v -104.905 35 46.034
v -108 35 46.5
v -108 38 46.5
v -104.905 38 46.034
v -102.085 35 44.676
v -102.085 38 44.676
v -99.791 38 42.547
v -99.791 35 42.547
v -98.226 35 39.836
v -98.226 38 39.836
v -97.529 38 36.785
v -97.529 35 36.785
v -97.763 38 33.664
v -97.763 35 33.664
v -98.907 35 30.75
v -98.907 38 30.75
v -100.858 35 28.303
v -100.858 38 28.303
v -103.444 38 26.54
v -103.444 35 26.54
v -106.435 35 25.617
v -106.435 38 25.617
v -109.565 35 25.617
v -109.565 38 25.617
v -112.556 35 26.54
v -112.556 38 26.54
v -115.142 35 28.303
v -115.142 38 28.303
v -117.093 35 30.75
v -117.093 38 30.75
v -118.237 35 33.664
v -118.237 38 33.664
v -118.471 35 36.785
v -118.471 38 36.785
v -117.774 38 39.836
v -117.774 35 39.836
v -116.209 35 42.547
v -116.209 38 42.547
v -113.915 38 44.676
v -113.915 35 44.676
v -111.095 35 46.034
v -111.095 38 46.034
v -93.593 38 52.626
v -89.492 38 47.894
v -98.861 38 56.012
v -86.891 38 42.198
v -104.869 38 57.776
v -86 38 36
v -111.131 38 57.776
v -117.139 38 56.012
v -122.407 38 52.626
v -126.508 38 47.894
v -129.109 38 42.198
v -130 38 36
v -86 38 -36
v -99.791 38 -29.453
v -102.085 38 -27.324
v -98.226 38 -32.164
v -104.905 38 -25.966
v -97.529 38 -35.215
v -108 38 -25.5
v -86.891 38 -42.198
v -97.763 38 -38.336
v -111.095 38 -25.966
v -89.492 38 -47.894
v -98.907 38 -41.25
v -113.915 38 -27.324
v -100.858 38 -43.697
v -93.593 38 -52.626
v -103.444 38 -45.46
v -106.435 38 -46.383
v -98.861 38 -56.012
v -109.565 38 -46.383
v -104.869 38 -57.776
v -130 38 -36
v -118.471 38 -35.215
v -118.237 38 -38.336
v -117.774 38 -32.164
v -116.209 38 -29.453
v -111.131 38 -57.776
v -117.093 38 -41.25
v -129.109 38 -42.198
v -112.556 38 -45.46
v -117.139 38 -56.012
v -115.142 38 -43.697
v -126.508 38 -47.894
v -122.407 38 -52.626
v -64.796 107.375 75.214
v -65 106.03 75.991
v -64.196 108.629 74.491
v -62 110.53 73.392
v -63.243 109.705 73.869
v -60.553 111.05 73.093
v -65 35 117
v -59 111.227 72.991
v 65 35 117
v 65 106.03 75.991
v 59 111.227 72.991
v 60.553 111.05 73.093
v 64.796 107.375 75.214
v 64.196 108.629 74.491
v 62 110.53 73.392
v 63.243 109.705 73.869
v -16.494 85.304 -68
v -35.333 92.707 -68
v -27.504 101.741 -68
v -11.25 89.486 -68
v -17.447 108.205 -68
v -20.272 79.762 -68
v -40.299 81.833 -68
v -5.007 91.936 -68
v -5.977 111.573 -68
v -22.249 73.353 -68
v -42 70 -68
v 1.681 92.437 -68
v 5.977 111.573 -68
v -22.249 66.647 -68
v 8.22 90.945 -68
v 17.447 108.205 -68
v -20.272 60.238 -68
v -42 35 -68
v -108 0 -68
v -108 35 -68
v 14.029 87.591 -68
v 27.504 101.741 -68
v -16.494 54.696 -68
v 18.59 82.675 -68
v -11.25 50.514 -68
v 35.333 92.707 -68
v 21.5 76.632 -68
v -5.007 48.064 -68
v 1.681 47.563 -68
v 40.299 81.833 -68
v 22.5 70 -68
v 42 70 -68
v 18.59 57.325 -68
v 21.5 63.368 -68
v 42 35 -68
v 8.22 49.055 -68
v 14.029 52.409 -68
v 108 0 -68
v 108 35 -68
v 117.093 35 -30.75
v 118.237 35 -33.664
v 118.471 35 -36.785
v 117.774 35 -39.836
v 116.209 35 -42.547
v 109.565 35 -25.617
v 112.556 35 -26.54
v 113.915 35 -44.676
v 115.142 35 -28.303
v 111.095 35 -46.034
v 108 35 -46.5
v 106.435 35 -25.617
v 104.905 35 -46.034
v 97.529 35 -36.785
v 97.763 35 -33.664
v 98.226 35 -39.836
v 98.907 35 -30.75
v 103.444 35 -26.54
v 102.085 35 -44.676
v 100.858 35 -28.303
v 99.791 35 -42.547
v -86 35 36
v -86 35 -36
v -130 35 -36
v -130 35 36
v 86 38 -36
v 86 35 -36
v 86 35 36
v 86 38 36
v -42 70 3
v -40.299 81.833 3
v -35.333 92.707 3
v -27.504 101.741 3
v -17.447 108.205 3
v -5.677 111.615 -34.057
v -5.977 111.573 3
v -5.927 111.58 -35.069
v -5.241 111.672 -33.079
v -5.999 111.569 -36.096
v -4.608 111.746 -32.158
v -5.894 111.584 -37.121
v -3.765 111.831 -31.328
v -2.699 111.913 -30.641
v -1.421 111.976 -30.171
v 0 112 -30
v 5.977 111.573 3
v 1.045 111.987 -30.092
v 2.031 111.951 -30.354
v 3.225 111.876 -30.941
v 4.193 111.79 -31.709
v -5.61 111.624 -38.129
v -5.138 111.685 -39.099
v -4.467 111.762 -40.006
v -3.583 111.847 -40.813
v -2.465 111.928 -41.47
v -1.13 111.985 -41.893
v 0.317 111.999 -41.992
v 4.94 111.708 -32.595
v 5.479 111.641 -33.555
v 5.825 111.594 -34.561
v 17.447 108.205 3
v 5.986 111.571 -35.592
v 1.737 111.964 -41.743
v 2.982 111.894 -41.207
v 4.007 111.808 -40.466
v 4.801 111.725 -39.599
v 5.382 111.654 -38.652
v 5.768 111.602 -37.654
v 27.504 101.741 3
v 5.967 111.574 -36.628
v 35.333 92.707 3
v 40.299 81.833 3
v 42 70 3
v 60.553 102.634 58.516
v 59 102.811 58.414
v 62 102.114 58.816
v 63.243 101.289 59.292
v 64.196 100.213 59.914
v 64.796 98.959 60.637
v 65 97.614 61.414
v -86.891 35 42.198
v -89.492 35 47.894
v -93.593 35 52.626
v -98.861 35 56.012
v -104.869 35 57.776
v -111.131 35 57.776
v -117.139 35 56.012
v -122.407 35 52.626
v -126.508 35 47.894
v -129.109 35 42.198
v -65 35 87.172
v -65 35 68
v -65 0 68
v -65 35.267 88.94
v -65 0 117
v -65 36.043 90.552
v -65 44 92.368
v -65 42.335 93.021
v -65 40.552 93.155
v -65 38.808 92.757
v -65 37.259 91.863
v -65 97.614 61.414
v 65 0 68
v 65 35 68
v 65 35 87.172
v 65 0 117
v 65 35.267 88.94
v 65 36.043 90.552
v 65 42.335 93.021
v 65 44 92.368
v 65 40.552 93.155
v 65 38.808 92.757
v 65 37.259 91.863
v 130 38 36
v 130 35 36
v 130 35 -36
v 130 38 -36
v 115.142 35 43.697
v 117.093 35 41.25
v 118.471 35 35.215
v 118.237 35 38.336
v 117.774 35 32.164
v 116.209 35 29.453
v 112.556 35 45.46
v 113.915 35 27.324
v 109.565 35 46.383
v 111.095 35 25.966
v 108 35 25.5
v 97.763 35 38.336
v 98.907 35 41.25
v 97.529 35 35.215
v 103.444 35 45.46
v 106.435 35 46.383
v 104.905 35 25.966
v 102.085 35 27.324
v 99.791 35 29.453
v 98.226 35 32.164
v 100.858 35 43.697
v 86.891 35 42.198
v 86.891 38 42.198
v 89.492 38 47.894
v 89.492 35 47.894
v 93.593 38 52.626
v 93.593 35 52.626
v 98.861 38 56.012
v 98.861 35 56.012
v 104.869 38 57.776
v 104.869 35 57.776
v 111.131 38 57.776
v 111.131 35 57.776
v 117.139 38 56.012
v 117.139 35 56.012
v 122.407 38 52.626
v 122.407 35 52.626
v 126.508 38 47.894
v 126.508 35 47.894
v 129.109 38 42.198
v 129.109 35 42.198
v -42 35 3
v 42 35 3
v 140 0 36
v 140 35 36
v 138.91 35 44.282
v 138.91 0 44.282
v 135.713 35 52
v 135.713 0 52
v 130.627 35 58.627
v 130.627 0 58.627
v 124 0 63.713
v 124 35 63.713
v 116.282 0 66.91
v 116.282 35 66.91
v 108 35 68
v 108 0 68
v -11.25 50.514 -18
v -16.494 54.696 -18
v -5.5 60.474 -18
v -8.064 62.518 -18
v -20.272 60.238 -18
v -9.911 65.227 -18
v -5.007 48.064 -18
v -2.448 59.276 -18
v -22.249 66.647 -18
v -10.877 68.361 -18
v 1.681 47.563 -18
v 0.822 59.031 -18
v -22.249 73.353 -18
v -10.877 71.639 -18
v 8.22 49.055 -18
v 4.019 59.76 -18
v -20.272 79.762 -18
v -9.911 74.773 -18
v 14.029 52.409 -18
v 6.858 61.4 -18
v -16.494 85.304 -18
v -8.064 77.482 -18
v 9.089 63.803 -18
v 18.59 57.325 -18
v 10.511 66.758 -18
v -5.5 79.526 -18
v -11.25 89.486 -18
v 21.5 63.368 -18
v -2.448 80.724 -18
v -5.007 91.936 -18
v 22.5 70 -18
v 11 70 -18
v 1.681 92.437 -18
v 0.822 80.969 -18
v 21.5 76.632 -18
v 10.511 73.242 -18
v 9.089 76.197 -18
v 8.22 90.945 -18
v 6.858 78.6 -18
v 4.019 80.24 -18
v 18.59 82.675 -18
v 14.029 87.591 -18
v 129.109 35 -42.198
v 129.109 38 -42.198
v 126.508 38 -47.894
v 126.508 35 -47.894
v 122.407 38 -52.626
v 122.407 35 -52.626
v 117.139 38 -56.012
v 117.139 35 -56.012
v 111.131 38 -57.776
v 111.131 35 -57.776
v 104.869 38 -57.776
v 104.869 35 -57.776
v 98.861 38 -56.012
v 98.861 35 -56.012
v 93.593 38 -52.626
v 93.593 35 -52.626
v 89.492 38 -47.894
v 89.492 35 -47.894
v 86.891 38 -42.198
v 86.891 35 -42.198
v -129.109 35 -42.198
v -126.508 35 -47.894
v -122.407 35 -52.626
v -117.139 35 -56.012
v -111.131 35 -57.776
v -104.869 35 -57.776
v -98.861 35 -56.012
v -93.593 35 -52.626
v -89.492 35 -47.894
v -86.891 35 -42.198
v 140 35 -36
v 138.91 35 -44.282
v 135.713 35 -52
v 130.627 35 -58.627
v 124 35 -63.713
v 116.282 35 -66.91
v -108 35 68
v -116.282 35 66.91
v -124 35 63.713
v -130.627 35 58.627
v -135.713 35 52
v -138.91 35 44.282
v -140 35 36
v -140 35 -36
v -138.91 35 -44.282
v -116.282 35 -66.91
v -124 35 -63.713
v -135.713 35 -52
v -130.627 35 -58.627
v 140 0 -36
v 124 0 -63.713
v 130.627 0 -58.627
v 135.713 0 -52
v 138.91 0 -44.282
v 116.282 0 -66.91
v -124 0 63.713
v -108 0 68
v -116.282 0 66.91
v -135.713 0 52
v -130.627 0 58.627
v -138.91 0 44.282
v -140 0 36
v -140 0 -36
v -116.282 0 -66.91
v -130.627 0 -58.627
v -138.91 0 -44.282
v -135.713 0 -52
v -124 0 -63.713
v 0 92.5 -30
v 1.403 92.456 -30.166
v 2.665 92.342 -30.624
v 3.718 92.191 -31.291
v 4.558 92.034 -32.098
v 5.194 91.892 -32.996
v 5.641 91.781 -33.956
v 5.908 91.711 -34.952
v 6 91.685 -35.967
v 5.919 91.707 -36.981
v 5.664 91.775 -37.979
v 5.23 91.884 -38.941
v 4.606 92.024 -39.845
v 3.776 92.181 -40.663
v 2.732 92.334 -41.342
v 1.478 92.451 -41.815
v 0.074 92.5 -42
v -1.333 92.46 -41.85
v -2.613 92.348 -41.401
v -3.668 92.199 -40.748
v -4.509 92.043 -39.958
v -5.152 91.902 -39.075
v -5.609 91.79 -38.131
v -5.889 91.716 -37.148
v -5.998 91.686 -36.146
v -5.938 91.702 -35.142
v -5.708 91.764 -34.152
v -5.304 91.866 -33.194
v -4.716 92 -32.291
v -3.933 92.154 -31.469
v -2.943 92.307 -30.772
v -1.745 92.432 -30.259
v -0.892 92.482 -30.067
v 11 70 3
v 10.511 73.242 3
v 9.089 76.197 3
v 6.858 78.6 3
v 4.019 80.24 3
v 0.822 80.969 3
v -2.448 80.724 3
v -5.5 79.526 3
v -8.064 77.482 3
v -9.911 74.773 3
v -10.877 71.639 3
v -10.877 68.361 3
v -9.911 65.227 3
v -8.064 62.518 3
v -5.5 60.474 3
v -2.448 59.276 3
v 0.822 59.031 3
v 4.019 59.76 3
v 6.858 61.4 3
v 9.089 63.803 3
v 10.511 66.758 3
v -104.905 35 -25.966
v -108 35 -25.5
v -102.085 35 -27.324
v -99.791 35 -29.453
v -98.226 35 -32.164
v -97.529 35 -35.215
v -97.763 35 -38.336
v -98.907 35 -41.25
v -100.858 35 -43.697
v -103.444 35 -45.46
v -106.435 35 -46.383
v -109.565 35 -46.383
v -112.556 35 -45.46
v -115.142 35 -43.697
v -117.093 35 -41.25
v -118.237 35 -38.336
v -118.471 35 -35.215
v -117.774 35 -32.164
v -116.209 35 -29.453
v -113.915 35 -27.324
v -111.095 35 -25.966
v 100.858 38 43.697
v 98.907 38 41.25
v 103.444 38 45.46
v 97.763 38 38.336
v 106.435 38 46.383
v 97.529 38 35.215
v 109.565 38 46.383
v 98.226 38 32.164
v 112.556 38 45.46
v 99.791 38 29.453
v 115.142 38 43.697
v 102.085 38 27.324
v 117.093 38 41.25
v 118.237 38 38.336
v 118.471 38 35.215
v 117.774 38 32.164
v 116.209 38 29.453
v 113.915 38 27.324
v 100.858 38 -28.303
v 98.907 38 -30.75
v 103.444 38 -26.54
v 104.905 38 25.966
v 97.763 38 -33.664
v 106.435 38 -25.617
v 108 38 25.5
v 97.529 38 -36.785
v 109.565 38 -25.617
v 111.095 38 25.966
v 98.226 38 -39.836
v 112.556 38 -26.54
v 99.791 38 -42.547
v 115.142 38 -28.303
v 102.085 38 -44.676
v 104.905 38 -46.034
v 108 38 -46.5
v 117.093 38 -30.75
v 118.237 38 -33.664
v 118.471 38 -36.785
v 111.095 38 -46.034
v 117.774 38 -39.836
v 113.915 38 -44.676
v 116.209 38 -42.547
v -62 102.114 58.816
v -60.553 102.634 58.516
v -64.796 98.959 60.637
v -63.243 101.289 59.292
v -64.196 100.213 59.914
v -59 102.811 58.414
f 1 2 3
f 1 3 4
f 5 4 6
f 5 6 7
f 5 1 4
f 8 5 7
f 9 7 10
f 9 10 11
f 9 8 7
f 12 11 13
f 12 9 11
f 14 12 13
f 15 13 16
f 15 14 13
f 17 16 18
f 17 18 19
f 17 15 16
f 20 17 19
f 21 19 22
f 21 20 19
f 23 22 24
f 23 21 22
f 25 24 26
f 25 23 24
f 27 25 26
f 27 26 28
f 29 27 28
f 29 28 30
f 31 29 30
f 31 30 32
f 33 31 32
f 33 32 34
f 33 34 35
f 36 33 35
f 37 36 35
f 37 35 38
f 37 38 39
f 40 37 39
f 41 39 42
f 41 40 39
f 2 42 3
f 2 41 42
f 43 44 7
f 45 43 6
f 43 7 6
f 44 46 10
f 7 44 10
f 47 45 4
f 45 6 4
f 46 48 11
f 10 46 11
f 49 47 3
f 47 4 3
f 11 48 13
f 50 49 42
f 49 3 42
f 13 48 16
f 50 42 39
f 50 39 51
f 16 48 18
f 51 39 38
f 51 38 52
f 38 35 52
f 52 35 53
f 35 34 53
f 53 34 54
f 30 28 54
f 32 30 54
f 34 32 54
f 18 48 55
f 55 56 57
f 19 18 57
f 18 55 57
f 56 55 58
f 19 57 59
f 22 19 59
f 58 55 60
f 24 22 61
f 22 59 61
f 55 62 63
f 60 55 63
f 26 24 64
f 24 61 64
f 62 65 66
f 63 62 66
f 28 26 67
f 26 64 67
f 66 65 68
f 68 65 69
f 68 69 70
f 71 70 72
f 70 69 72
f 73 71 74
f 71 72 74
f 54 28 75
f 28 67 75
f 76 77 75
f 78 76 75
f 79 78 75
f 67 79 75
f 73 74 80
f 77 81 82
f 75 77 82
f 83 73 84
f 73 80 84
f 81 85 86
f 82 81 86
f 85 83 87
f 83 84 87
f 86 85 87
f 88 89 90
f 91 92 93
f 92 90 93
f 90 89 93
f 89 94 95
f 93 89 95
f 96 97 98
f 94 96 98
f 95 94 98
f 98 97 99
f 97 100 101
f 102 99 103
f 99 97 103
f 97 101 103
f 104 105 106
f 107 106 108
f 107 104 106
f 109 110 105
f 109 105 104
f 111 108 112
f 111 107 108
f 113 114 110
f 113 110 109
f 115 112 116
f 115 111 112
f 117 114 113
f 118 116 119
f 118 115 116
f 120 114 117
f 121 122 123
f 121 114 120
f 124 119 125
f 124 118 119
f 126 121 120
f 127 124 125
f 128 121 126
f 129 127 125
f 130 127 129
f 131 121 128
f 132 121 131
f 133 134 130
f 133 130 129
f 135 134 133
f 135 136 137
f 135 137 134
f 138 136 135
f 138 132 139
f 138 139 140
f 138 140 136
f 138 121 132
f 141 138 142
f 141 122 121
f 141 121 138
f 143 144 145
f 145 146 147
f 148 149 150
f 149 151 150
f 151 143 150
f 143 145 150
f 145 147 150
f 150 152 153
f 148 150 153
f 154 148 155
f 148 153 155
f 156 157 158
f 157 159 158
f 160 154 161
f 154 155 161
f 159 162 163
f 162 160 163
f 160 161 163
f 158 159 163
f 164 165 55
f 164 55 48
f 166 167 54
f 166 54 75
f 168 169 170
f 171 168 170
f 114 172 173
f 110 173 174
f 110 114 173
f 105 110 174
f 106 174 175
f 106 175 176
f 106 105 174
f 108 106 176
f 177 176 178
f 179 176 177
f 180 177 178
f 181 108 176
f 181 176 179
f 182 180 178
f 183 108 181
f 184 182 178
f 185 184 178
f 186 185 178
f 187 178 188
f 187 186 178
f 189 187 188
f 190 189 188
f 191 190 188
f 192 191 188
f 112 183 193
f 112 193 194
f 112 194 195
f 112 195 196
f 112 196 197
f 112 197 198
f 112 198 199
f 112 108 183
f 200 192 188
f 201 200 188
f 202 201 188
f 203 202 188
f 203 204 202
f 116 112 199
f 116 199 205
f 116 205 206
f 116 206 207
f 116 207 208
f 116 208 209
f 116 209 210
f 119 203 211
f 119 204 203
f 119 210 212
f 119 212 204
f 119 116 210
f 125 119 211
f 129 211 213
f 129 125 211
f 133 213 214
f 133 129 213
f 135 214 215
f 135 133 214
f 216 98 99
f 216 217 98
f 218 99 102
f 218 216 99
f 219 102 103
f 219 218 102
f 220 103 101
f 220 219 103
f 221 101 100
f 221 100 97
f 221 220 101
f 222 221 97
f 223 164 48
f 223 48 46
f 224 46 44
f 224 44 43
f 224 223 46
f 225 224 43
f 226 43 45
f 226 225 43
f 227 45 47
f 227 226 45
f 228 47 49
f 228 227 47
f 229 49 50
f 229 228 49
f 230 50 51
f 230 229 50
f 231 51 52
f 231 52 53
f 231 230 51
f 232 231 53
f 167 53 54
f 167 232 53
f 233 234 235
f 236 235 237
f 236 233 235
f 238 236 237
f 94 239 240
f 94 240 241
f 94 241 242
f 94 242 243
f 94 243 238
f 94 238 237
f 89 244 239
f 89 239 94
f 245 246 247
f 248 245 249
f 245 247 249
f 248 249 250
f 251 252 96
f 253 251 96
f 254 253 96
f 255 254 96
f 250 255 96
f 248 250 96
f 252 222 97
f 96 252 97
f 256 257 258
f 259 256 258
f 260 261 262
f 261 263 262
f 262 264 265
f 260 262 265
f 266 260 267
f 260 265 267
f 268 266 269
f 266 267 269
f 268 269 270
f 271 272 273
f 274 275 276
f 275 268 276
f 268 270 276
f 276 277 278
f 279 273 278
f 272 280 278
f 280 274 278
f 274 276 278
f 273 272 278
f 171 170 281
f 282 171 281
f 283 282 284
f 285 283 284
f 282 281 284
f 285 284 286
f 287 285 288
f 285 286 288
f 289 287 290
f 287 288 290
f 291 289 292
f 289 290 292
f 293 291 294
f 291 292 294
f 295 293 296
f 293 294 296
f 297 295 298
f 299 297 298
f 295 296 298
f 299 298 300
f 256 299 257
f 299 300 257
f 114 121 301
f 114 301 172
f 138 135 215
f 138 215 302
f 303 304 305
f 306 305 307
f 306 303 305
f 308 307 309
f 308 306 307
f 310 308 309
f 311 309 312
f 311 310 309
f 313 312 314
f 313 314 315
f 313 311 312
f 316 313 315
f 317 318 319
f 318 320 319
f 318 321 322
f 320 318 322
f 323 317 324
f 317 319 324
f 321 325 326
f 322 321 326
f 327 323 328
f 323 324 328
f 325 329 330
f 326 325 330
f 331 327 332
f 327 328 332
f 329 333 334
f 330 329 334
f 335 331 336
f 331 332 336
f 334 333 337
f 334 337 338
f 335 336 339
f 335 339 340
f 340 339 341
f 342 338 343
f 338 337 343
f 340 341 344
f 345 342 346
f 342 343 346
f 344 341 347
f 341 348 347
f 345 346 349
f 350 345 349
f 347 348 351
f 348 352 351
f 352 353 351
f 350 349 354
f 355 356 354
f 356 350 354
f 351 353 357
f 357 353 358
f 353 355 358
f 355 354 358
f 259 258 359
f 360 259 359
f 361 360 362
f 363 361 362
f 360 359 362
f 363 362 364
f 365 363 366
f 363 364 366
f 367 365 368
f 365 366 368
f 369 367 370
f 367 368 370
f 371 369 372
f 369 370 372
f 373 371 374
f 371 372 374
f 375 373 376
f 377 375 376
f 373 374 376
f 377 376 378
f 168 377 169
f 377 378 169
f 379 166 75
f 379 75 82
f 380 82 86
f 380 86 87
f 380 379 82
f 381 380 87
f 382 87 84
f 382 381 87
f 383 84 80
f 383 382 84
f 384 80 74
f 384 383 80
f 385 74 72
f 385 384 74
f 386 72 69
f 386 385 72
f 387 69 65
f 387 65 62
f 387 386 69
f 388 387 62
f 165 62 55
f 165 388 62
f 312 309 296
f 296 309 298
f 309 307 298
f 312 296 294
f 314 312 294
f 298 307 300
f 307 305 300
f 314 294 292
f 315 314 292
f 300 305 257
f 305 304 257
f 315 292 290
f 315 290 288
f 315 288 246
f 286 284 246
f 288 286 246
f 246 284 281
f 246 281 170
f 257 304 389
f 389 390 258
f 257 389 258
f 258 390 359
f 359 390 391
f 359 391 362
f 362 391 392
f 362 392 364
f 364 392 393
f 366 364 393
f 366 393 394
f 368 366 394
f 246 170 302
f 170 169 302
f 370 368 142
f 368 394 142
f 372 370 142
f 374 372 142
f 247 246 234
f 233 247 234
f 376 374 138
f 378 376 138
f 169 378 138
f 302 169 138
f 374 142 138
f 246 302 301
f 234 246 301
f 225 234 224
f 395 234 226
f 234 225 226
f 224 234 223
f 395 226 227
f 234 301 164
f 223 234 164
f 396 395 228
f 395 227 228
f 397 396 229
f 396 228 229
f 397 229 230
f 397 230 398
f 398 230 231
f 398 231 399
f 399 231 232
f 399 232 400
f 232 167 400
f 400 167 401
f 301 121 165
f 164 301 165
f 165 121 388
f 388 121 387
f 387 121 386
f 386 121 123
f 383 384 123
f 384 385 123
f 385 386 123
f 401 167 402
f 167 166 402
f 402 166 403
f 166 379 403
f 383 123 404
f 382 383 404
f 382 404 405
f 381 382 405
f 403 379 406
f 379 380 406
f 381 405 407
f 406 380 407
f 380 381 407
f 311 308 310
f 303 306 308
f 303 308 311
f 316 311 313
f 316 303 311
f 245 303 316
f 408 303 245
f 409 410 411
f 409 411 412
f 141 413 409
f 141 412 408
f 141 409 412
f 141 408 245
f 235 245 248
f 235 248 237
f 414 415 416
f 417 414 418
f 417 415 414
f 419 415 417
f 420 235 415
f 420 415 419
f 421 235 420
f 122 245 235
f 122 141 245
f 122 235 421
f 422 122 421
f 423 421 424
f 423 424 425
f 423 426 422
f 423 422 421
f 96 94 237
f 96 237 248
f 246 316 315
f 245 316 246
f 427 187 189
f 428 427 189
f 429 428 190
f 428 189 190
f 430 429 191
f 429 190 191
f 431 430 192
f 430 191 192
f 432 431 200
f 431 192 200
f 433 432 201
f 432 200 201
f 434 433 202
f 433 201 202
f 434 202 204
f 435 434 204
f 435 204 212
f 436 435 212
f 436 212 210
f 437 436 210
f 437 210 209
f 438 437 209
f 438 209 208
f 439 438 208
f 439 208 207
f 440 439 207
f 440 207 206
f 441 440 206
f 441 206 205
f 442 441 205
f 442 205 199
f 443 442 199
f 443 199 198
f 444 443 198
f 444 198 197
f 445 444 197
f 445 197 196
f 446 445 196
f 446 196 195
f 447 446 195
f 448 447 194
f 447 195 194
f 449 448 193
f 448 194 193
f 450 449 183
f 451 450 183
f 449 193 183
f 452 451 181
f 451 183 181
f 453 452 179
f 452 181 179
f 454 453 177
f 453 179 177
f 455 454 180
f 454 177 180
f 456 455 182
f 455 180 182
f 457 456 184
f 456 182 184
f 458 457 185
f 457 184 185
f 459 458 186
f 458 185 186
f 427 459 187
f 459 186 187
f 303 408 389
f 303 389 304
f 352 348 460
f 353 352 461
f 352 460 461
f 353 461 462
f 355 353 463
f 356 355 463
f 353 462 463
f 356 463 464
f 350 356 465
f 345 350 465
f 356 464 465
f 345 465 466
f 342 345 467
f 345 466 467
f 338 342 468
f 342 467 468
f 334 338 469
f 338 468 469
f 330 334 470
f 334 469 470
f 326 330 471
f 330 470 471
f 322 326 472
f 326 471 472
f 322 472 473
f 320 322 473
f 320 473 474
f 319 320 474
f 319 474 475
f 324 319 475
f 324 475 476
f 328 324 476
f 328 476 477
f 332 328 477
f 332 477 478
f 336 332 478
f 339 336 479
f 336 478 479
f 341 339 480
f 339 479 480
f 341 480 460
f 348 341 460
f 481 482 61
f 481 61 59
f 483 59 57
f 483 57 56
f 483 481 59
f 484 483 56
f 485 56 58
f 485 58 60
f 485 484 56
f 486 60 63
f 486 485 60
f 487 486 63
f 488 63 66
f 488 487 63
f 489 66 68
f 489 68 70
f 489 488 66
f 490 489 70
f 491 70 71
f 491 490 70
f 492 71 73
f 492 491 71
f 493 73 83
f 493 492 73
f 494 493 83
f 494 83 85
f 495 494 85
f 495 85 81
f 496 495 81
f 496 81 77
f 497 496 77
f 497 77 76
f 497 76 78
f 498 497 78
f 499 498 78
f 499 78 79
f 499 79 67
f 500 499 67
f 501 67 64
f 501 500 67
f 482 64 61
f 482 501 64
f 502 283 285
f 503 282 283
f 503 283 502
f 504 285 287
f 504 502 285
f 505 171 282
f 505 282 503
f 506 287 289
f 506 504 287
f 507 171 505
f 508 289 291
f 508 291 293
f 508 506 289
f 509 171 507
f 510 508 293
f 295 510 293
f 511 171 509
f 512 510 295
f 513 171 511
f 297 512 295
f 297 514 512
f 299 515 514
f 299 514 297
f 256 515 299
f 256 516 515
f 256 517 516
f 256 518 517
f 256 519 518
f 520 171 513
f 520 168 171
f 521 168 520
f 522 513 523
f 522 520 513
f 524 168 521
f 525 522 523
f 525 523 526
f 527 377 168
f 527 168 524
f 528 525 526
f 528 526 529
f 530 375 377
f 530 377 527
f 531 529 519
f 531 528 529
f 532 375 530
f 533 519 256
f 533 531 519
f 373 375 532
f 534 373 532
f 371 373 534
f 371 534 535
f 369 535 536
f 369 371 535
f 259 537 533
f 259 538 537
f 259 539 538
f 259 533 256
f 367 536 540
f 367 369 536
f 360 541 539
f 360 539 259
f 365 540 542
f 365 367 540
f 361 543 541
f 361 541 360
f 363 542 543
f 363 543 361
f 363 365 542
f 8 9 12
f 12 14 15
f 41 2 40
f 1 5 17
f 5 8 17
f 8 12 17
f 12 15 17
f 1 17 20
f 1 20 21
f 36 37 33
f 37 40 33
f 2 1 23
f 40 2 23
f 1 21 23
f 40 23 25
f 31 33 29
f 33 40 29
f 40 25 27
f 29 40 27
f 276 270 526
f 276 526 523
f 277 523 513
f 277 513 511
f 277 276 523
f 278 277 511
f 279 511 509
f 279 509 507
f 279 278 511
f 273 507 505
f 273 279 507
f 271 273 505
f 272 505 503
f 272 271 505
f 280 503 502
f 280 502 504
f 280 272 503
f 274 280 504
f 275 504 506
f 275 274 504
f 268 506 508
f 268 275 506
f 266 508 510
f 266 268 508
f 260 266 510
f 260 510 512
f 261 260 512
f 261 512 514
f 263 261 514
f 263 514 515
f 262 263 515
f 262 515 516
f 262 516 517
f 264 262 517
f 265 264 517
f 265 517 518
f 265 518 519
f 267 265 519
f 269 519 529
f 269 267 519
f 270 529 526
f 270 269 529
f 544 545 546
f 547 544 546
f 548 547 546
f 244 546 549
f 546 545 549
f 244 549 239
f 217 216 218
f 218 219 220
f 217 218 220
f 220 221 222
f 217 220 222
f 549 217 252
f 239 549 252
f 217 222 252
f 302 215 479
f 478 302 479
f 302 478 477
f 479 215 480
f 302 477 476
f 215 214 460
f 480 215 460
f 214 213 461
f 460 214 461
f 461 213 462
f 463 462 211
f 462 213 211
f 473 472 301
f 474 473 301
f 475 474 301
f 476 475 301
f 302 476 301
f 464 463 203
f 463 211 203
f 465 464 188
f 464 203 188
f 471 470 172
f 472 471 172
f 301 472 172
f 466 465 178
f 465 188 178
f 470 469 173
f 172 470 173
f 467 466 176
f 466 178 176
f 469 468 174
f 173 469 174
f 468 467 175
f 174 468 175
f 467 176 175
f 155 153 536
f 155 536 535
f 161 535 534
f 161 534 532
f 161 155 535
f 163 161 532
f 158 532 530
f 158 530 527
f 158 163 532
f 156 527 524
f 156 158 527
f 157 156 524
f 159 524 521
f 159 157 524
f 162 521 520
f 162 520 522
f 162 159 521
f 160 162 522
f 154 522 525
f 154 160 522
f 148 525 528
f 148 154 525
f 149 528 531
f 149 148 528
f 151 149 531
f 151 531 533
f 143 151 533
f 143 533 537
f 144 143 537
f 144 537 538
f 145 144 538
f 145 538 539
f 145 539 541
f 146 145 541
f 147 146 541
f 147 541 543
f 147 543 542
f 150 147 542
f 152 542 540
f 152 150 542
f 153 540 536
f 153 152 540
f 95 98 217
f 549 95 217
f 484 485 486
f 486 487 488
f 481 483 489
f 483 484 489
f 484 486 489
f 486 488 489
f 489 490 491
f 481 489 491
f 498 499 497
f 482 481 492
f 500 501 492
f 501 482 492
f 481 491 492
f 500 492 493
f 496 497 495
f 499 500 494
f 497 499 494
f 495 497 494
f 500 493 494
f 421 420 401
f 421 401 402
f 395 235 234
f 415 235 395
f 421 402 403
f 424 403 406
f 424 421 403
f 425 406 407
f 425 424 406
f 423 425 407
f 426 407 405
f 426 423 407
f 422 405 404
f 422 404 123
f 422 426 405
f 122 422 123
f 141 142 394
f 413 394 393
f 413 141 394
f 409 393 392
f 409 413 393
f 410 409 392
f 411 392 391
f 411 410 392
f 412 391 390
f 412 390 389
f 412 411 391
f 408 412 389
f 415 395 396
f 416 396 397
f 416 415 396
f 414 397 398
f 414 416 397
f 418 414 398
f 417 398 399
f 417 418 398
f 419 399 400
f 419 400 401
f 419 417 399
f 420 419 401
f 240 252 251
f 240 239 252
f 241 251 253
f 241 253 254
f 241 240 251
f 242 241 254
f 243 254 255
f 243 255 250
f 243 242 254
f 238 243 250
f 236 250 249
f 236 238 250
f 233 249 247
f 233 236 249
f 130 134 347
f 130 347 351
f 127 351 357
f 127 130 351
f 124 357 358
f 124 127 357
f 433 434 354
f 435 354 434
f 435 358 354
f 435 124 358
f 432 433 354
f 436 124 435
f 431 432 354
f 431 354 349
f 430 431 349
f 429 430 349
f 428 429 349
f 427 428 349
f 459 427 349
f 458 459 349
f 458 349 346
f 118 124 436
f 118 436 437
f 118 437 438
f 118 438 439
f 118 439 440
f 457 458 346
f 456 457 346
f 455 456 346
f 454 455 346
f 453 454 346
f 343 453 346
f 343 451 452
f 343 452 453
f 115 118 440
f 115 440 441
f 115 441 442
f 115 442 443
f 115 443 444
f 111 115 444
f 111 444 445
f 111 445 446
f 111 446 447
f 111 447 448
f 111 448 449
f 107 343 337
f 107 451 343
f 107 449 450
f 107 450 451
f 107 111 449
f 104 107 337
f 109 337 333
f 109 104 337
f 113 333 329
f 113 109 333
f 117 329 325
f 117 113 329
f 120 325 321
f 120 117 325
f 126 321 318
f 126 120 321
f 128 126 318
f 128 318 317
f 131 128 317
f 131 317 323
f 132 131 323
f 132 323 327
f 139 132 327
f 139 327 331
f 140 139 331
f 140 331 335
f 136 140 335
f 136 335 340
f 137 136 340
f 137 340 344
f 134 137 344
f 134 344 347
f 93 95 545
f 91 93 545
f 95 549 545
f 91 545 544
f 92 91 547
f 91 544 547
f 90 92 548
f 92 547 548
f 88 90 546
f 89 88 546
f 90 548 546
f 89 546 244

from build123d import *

# Parameters (mm, degrees)
Y_KSEKLIK_EKSTR_ZYON1_DEPTH              = 35
IZIM3_R                                  = 10.5
Y_KSEKLIK_EKSTR_ZYON2_DEPTH              = 3
Y_KSEKLIK_EKSTR_ZYON3_DEPTH              = 71
IZIM5_R                                  = 11
KES_EKSTR_ZYON1_DEPTH                    = 21
IZIM6_R                                  = 6
KES_EKSTR_ZYON2_DEPTH                    = 23
M10_START                                = -68
M10_ALT_GEN_BA_L_C_VATA_IN_HAV_A1_OUTL_R = 22.5
M10_ALT_GEN_BA_L_C_VATA_IN_HAV_A1_DEPTH  = 50
IZIM9_W                                  = 130
IZIM9_H                                  = 35
Y_KSEKLIK_EKSTR_ZYON4_DEPTH              = 49
Y_KSEKLIK_EKSTR_ZYON5_DEPTH              = 130
RADYUS1_R                                = 6
RADYUS2_R                                = 6


# Read off the part's stored shape, not the designer's step: M10 Altıgen Başlı Cıvata İçin Havşa1
with BuildPart() as part:
    # Çizim1 → Yükseklik-Ekstrüzyon1 (new body)
    with BuildSketch(Plane(origin=(0, 0, 0), x_dir=(1, 0, 0), z_dir=(0, 1, 0))):
        with BuildLine():
            Line((-108, 68), (108, 68))
            ThreePointArc((108, 68), (130.627416998, 58.627416998), (140, 36))
            Line((140, 36), (140, -36))
            ThreePointArc((140, -36), (130.627416998, -58.627416998), (108, -68))
            Line((108, -68), (-108, -68))
            ThreePointArc((-108, -68), (-130.627416998, -58.627416998), (-140, -36))
            Line((-140, -36), (-140, 36))
            ThreePointArc((-140, 36), (-130.627416998, 58.627416998), (-108, 68))
        make_face()
    extrude(amount=Y_KSEKLIK_EKSTR_ZYON1_DEPTH)

    # Çizim3 → Yükseklik-Ekstrüzyon2 (add)
    # profile 1 of 2: a face of its own
    with BuildSketch(Plane(origin=(0, 35, 0), x_dir=(1, 0, 0), z_dir=(0, 1, 0))):
        with BuildLine():
            Line((-130, -36), (-130, 36))
            ThreePointArc((-130, 36), (-108, 58), (-86, 36))
            Line((-86, 36), (-86, -36))
            ThreePointArc((-86, -36), (-108, -58), (-130, -36))
        make_face()
        with Locations(Location((-108, 36, 0), (0, 0, 270))):
            Circle(IZIM3_R, mode=Mode.SUBTRACT)
        with Locations(Location((-108, -36, 0), (0, 0, 270))):
            Circle(IZIM3_R, mode=Mode.SUBTRACT)
    # profile 2 of 2: a face of its own
    with BuildSketch(Plane(origin=(0, 35, 0), x_dir=(1, 0, 0), z_dir=(0, 1, 0))):
        with BuildLine():
            Line((130, -36), (130, 36))
            ThreePointArc((130, 36), (108, 58), (86, 36))
            Line((86, 36), (86, -36))
            ThreePointArc((86, -36), (108, -58), (130, -36))
        make_face()
        with Locations(Location((108, -36, 0), (0, 0, 90))):
            Circle(IZIM3_R, mode=Mode.SUBTRACT)
        with Locations(Location((108, 36, 0), (0, 0, 90))):
            Circle(IZIM3_R, mode=Mode.SUBTRACT)
    extrude(amount=Y_KSEKLIK_EKSTR_ZYON2_DEPTH)

    # Çizim4 → Yükseklik-Ekstrüzyon3 (add)
    with BuildSketch(Plane(origin=(0, 0, -68), x_dir=(-1, 0, 0), z_dir=(0, 0, -1))):
        with BuildLine():
            Line((-42, 70), (-42, 35))
            Line((-42, 35), (42, 35))
            Line((42, 35), (42, 70))
            ThreePointArc((42, 70), (0, 112), (-42, 70))
        make_face()
    extrude(amount=-Y_KSEKLIK_EKSTR_ZYON3_DEPTH)

    # Çizim5 → Kes-Ekstrüzyon1 (cut)
    with BuildSketch(Plane.XY.offset(3)):
        with Locations((0, 70)):
            Circle(IZIM5_R)
    extrude(amount=-KES_EKSTR_ZYON1_DEPTH, mode=Mode.SUBTRACT)

    # Çizim6 → Kes-Ekstrüzyon2 (cut)
    with BuildSketch(Plane(origin=(0, 112, 0), x_dir=(1, 0, 0), z_dir=(0, 1, 0))):
        with Locations(Location((0, 36, 0), (0, 0, 270))):
            Circle(IZIM6_R)
    extrude(amount=-KES_EKSTR_ZYON2_DEPTH, mode=Mode.SUBTRACT)

    # M10 Altıgen Başlı Cıvata İçin Havşa1 outl → M10 Altıgen Başlı Cıvata İçin Havşa1 (cut)
    with BuildSketch(Plane.XY.offset(M10_START)):
        with Locations((0, 70)):
            Circle(M10_ALT_GEN_BA_L_C_VATA_IN_HAV_A1_OUTL_R)
    extrude(amount=M10_ALT_GEN_BA_L_C_VATA_IN_HAV_A1_DEPTH, mode=Mode.SUBTRACT)

    # Çizim9 → Yükseklik-Ekstrüzyon4 (add)
    with BuildSketch(Plane.XY.offset(68)):
        with Locations((0, 17.5)):
            Rectangle(IZIM9_W, IZIM9_H)
    extrude(amount=Y_KSEKLIK_EKSTR_ZYON4_DEPTH)

    # Çizim10 → Yükseklik-Ekstrüzyon5 (add)
    with BuildSketch(Plane(origin=(65, 0, 0), x_dir=(0, 0, -1), z_dir=(1, 0, 0))):
        Polygon((-117, 35), (-72.990557656, 111.226590152), (-58.413699339, 102.810637079), (-97.564188911, 35), align=None)
    extrude(amount=-Y_KSEKLIK_EKSTR_ZYON5_DEPTH)

    # Radyus1
    radyus1_edges = [part.edges().sort_by_distance(p)[0] for p in [
        (-65, 107.018613616, 65.702128498),
        (65, 107.018613616, 65.702128498),
    ]]
    fillet(radyus1_edges, radius=RADYUS1_R)

    # Radyus2
    radyus2_edges = [part.edges().sort_by_distance(p)[0] for p in [
        (0, 35, 97.564188911),
    ]]
    fillet(radyus2_edges, radius=RADYUS2_R)


solid = part.part
